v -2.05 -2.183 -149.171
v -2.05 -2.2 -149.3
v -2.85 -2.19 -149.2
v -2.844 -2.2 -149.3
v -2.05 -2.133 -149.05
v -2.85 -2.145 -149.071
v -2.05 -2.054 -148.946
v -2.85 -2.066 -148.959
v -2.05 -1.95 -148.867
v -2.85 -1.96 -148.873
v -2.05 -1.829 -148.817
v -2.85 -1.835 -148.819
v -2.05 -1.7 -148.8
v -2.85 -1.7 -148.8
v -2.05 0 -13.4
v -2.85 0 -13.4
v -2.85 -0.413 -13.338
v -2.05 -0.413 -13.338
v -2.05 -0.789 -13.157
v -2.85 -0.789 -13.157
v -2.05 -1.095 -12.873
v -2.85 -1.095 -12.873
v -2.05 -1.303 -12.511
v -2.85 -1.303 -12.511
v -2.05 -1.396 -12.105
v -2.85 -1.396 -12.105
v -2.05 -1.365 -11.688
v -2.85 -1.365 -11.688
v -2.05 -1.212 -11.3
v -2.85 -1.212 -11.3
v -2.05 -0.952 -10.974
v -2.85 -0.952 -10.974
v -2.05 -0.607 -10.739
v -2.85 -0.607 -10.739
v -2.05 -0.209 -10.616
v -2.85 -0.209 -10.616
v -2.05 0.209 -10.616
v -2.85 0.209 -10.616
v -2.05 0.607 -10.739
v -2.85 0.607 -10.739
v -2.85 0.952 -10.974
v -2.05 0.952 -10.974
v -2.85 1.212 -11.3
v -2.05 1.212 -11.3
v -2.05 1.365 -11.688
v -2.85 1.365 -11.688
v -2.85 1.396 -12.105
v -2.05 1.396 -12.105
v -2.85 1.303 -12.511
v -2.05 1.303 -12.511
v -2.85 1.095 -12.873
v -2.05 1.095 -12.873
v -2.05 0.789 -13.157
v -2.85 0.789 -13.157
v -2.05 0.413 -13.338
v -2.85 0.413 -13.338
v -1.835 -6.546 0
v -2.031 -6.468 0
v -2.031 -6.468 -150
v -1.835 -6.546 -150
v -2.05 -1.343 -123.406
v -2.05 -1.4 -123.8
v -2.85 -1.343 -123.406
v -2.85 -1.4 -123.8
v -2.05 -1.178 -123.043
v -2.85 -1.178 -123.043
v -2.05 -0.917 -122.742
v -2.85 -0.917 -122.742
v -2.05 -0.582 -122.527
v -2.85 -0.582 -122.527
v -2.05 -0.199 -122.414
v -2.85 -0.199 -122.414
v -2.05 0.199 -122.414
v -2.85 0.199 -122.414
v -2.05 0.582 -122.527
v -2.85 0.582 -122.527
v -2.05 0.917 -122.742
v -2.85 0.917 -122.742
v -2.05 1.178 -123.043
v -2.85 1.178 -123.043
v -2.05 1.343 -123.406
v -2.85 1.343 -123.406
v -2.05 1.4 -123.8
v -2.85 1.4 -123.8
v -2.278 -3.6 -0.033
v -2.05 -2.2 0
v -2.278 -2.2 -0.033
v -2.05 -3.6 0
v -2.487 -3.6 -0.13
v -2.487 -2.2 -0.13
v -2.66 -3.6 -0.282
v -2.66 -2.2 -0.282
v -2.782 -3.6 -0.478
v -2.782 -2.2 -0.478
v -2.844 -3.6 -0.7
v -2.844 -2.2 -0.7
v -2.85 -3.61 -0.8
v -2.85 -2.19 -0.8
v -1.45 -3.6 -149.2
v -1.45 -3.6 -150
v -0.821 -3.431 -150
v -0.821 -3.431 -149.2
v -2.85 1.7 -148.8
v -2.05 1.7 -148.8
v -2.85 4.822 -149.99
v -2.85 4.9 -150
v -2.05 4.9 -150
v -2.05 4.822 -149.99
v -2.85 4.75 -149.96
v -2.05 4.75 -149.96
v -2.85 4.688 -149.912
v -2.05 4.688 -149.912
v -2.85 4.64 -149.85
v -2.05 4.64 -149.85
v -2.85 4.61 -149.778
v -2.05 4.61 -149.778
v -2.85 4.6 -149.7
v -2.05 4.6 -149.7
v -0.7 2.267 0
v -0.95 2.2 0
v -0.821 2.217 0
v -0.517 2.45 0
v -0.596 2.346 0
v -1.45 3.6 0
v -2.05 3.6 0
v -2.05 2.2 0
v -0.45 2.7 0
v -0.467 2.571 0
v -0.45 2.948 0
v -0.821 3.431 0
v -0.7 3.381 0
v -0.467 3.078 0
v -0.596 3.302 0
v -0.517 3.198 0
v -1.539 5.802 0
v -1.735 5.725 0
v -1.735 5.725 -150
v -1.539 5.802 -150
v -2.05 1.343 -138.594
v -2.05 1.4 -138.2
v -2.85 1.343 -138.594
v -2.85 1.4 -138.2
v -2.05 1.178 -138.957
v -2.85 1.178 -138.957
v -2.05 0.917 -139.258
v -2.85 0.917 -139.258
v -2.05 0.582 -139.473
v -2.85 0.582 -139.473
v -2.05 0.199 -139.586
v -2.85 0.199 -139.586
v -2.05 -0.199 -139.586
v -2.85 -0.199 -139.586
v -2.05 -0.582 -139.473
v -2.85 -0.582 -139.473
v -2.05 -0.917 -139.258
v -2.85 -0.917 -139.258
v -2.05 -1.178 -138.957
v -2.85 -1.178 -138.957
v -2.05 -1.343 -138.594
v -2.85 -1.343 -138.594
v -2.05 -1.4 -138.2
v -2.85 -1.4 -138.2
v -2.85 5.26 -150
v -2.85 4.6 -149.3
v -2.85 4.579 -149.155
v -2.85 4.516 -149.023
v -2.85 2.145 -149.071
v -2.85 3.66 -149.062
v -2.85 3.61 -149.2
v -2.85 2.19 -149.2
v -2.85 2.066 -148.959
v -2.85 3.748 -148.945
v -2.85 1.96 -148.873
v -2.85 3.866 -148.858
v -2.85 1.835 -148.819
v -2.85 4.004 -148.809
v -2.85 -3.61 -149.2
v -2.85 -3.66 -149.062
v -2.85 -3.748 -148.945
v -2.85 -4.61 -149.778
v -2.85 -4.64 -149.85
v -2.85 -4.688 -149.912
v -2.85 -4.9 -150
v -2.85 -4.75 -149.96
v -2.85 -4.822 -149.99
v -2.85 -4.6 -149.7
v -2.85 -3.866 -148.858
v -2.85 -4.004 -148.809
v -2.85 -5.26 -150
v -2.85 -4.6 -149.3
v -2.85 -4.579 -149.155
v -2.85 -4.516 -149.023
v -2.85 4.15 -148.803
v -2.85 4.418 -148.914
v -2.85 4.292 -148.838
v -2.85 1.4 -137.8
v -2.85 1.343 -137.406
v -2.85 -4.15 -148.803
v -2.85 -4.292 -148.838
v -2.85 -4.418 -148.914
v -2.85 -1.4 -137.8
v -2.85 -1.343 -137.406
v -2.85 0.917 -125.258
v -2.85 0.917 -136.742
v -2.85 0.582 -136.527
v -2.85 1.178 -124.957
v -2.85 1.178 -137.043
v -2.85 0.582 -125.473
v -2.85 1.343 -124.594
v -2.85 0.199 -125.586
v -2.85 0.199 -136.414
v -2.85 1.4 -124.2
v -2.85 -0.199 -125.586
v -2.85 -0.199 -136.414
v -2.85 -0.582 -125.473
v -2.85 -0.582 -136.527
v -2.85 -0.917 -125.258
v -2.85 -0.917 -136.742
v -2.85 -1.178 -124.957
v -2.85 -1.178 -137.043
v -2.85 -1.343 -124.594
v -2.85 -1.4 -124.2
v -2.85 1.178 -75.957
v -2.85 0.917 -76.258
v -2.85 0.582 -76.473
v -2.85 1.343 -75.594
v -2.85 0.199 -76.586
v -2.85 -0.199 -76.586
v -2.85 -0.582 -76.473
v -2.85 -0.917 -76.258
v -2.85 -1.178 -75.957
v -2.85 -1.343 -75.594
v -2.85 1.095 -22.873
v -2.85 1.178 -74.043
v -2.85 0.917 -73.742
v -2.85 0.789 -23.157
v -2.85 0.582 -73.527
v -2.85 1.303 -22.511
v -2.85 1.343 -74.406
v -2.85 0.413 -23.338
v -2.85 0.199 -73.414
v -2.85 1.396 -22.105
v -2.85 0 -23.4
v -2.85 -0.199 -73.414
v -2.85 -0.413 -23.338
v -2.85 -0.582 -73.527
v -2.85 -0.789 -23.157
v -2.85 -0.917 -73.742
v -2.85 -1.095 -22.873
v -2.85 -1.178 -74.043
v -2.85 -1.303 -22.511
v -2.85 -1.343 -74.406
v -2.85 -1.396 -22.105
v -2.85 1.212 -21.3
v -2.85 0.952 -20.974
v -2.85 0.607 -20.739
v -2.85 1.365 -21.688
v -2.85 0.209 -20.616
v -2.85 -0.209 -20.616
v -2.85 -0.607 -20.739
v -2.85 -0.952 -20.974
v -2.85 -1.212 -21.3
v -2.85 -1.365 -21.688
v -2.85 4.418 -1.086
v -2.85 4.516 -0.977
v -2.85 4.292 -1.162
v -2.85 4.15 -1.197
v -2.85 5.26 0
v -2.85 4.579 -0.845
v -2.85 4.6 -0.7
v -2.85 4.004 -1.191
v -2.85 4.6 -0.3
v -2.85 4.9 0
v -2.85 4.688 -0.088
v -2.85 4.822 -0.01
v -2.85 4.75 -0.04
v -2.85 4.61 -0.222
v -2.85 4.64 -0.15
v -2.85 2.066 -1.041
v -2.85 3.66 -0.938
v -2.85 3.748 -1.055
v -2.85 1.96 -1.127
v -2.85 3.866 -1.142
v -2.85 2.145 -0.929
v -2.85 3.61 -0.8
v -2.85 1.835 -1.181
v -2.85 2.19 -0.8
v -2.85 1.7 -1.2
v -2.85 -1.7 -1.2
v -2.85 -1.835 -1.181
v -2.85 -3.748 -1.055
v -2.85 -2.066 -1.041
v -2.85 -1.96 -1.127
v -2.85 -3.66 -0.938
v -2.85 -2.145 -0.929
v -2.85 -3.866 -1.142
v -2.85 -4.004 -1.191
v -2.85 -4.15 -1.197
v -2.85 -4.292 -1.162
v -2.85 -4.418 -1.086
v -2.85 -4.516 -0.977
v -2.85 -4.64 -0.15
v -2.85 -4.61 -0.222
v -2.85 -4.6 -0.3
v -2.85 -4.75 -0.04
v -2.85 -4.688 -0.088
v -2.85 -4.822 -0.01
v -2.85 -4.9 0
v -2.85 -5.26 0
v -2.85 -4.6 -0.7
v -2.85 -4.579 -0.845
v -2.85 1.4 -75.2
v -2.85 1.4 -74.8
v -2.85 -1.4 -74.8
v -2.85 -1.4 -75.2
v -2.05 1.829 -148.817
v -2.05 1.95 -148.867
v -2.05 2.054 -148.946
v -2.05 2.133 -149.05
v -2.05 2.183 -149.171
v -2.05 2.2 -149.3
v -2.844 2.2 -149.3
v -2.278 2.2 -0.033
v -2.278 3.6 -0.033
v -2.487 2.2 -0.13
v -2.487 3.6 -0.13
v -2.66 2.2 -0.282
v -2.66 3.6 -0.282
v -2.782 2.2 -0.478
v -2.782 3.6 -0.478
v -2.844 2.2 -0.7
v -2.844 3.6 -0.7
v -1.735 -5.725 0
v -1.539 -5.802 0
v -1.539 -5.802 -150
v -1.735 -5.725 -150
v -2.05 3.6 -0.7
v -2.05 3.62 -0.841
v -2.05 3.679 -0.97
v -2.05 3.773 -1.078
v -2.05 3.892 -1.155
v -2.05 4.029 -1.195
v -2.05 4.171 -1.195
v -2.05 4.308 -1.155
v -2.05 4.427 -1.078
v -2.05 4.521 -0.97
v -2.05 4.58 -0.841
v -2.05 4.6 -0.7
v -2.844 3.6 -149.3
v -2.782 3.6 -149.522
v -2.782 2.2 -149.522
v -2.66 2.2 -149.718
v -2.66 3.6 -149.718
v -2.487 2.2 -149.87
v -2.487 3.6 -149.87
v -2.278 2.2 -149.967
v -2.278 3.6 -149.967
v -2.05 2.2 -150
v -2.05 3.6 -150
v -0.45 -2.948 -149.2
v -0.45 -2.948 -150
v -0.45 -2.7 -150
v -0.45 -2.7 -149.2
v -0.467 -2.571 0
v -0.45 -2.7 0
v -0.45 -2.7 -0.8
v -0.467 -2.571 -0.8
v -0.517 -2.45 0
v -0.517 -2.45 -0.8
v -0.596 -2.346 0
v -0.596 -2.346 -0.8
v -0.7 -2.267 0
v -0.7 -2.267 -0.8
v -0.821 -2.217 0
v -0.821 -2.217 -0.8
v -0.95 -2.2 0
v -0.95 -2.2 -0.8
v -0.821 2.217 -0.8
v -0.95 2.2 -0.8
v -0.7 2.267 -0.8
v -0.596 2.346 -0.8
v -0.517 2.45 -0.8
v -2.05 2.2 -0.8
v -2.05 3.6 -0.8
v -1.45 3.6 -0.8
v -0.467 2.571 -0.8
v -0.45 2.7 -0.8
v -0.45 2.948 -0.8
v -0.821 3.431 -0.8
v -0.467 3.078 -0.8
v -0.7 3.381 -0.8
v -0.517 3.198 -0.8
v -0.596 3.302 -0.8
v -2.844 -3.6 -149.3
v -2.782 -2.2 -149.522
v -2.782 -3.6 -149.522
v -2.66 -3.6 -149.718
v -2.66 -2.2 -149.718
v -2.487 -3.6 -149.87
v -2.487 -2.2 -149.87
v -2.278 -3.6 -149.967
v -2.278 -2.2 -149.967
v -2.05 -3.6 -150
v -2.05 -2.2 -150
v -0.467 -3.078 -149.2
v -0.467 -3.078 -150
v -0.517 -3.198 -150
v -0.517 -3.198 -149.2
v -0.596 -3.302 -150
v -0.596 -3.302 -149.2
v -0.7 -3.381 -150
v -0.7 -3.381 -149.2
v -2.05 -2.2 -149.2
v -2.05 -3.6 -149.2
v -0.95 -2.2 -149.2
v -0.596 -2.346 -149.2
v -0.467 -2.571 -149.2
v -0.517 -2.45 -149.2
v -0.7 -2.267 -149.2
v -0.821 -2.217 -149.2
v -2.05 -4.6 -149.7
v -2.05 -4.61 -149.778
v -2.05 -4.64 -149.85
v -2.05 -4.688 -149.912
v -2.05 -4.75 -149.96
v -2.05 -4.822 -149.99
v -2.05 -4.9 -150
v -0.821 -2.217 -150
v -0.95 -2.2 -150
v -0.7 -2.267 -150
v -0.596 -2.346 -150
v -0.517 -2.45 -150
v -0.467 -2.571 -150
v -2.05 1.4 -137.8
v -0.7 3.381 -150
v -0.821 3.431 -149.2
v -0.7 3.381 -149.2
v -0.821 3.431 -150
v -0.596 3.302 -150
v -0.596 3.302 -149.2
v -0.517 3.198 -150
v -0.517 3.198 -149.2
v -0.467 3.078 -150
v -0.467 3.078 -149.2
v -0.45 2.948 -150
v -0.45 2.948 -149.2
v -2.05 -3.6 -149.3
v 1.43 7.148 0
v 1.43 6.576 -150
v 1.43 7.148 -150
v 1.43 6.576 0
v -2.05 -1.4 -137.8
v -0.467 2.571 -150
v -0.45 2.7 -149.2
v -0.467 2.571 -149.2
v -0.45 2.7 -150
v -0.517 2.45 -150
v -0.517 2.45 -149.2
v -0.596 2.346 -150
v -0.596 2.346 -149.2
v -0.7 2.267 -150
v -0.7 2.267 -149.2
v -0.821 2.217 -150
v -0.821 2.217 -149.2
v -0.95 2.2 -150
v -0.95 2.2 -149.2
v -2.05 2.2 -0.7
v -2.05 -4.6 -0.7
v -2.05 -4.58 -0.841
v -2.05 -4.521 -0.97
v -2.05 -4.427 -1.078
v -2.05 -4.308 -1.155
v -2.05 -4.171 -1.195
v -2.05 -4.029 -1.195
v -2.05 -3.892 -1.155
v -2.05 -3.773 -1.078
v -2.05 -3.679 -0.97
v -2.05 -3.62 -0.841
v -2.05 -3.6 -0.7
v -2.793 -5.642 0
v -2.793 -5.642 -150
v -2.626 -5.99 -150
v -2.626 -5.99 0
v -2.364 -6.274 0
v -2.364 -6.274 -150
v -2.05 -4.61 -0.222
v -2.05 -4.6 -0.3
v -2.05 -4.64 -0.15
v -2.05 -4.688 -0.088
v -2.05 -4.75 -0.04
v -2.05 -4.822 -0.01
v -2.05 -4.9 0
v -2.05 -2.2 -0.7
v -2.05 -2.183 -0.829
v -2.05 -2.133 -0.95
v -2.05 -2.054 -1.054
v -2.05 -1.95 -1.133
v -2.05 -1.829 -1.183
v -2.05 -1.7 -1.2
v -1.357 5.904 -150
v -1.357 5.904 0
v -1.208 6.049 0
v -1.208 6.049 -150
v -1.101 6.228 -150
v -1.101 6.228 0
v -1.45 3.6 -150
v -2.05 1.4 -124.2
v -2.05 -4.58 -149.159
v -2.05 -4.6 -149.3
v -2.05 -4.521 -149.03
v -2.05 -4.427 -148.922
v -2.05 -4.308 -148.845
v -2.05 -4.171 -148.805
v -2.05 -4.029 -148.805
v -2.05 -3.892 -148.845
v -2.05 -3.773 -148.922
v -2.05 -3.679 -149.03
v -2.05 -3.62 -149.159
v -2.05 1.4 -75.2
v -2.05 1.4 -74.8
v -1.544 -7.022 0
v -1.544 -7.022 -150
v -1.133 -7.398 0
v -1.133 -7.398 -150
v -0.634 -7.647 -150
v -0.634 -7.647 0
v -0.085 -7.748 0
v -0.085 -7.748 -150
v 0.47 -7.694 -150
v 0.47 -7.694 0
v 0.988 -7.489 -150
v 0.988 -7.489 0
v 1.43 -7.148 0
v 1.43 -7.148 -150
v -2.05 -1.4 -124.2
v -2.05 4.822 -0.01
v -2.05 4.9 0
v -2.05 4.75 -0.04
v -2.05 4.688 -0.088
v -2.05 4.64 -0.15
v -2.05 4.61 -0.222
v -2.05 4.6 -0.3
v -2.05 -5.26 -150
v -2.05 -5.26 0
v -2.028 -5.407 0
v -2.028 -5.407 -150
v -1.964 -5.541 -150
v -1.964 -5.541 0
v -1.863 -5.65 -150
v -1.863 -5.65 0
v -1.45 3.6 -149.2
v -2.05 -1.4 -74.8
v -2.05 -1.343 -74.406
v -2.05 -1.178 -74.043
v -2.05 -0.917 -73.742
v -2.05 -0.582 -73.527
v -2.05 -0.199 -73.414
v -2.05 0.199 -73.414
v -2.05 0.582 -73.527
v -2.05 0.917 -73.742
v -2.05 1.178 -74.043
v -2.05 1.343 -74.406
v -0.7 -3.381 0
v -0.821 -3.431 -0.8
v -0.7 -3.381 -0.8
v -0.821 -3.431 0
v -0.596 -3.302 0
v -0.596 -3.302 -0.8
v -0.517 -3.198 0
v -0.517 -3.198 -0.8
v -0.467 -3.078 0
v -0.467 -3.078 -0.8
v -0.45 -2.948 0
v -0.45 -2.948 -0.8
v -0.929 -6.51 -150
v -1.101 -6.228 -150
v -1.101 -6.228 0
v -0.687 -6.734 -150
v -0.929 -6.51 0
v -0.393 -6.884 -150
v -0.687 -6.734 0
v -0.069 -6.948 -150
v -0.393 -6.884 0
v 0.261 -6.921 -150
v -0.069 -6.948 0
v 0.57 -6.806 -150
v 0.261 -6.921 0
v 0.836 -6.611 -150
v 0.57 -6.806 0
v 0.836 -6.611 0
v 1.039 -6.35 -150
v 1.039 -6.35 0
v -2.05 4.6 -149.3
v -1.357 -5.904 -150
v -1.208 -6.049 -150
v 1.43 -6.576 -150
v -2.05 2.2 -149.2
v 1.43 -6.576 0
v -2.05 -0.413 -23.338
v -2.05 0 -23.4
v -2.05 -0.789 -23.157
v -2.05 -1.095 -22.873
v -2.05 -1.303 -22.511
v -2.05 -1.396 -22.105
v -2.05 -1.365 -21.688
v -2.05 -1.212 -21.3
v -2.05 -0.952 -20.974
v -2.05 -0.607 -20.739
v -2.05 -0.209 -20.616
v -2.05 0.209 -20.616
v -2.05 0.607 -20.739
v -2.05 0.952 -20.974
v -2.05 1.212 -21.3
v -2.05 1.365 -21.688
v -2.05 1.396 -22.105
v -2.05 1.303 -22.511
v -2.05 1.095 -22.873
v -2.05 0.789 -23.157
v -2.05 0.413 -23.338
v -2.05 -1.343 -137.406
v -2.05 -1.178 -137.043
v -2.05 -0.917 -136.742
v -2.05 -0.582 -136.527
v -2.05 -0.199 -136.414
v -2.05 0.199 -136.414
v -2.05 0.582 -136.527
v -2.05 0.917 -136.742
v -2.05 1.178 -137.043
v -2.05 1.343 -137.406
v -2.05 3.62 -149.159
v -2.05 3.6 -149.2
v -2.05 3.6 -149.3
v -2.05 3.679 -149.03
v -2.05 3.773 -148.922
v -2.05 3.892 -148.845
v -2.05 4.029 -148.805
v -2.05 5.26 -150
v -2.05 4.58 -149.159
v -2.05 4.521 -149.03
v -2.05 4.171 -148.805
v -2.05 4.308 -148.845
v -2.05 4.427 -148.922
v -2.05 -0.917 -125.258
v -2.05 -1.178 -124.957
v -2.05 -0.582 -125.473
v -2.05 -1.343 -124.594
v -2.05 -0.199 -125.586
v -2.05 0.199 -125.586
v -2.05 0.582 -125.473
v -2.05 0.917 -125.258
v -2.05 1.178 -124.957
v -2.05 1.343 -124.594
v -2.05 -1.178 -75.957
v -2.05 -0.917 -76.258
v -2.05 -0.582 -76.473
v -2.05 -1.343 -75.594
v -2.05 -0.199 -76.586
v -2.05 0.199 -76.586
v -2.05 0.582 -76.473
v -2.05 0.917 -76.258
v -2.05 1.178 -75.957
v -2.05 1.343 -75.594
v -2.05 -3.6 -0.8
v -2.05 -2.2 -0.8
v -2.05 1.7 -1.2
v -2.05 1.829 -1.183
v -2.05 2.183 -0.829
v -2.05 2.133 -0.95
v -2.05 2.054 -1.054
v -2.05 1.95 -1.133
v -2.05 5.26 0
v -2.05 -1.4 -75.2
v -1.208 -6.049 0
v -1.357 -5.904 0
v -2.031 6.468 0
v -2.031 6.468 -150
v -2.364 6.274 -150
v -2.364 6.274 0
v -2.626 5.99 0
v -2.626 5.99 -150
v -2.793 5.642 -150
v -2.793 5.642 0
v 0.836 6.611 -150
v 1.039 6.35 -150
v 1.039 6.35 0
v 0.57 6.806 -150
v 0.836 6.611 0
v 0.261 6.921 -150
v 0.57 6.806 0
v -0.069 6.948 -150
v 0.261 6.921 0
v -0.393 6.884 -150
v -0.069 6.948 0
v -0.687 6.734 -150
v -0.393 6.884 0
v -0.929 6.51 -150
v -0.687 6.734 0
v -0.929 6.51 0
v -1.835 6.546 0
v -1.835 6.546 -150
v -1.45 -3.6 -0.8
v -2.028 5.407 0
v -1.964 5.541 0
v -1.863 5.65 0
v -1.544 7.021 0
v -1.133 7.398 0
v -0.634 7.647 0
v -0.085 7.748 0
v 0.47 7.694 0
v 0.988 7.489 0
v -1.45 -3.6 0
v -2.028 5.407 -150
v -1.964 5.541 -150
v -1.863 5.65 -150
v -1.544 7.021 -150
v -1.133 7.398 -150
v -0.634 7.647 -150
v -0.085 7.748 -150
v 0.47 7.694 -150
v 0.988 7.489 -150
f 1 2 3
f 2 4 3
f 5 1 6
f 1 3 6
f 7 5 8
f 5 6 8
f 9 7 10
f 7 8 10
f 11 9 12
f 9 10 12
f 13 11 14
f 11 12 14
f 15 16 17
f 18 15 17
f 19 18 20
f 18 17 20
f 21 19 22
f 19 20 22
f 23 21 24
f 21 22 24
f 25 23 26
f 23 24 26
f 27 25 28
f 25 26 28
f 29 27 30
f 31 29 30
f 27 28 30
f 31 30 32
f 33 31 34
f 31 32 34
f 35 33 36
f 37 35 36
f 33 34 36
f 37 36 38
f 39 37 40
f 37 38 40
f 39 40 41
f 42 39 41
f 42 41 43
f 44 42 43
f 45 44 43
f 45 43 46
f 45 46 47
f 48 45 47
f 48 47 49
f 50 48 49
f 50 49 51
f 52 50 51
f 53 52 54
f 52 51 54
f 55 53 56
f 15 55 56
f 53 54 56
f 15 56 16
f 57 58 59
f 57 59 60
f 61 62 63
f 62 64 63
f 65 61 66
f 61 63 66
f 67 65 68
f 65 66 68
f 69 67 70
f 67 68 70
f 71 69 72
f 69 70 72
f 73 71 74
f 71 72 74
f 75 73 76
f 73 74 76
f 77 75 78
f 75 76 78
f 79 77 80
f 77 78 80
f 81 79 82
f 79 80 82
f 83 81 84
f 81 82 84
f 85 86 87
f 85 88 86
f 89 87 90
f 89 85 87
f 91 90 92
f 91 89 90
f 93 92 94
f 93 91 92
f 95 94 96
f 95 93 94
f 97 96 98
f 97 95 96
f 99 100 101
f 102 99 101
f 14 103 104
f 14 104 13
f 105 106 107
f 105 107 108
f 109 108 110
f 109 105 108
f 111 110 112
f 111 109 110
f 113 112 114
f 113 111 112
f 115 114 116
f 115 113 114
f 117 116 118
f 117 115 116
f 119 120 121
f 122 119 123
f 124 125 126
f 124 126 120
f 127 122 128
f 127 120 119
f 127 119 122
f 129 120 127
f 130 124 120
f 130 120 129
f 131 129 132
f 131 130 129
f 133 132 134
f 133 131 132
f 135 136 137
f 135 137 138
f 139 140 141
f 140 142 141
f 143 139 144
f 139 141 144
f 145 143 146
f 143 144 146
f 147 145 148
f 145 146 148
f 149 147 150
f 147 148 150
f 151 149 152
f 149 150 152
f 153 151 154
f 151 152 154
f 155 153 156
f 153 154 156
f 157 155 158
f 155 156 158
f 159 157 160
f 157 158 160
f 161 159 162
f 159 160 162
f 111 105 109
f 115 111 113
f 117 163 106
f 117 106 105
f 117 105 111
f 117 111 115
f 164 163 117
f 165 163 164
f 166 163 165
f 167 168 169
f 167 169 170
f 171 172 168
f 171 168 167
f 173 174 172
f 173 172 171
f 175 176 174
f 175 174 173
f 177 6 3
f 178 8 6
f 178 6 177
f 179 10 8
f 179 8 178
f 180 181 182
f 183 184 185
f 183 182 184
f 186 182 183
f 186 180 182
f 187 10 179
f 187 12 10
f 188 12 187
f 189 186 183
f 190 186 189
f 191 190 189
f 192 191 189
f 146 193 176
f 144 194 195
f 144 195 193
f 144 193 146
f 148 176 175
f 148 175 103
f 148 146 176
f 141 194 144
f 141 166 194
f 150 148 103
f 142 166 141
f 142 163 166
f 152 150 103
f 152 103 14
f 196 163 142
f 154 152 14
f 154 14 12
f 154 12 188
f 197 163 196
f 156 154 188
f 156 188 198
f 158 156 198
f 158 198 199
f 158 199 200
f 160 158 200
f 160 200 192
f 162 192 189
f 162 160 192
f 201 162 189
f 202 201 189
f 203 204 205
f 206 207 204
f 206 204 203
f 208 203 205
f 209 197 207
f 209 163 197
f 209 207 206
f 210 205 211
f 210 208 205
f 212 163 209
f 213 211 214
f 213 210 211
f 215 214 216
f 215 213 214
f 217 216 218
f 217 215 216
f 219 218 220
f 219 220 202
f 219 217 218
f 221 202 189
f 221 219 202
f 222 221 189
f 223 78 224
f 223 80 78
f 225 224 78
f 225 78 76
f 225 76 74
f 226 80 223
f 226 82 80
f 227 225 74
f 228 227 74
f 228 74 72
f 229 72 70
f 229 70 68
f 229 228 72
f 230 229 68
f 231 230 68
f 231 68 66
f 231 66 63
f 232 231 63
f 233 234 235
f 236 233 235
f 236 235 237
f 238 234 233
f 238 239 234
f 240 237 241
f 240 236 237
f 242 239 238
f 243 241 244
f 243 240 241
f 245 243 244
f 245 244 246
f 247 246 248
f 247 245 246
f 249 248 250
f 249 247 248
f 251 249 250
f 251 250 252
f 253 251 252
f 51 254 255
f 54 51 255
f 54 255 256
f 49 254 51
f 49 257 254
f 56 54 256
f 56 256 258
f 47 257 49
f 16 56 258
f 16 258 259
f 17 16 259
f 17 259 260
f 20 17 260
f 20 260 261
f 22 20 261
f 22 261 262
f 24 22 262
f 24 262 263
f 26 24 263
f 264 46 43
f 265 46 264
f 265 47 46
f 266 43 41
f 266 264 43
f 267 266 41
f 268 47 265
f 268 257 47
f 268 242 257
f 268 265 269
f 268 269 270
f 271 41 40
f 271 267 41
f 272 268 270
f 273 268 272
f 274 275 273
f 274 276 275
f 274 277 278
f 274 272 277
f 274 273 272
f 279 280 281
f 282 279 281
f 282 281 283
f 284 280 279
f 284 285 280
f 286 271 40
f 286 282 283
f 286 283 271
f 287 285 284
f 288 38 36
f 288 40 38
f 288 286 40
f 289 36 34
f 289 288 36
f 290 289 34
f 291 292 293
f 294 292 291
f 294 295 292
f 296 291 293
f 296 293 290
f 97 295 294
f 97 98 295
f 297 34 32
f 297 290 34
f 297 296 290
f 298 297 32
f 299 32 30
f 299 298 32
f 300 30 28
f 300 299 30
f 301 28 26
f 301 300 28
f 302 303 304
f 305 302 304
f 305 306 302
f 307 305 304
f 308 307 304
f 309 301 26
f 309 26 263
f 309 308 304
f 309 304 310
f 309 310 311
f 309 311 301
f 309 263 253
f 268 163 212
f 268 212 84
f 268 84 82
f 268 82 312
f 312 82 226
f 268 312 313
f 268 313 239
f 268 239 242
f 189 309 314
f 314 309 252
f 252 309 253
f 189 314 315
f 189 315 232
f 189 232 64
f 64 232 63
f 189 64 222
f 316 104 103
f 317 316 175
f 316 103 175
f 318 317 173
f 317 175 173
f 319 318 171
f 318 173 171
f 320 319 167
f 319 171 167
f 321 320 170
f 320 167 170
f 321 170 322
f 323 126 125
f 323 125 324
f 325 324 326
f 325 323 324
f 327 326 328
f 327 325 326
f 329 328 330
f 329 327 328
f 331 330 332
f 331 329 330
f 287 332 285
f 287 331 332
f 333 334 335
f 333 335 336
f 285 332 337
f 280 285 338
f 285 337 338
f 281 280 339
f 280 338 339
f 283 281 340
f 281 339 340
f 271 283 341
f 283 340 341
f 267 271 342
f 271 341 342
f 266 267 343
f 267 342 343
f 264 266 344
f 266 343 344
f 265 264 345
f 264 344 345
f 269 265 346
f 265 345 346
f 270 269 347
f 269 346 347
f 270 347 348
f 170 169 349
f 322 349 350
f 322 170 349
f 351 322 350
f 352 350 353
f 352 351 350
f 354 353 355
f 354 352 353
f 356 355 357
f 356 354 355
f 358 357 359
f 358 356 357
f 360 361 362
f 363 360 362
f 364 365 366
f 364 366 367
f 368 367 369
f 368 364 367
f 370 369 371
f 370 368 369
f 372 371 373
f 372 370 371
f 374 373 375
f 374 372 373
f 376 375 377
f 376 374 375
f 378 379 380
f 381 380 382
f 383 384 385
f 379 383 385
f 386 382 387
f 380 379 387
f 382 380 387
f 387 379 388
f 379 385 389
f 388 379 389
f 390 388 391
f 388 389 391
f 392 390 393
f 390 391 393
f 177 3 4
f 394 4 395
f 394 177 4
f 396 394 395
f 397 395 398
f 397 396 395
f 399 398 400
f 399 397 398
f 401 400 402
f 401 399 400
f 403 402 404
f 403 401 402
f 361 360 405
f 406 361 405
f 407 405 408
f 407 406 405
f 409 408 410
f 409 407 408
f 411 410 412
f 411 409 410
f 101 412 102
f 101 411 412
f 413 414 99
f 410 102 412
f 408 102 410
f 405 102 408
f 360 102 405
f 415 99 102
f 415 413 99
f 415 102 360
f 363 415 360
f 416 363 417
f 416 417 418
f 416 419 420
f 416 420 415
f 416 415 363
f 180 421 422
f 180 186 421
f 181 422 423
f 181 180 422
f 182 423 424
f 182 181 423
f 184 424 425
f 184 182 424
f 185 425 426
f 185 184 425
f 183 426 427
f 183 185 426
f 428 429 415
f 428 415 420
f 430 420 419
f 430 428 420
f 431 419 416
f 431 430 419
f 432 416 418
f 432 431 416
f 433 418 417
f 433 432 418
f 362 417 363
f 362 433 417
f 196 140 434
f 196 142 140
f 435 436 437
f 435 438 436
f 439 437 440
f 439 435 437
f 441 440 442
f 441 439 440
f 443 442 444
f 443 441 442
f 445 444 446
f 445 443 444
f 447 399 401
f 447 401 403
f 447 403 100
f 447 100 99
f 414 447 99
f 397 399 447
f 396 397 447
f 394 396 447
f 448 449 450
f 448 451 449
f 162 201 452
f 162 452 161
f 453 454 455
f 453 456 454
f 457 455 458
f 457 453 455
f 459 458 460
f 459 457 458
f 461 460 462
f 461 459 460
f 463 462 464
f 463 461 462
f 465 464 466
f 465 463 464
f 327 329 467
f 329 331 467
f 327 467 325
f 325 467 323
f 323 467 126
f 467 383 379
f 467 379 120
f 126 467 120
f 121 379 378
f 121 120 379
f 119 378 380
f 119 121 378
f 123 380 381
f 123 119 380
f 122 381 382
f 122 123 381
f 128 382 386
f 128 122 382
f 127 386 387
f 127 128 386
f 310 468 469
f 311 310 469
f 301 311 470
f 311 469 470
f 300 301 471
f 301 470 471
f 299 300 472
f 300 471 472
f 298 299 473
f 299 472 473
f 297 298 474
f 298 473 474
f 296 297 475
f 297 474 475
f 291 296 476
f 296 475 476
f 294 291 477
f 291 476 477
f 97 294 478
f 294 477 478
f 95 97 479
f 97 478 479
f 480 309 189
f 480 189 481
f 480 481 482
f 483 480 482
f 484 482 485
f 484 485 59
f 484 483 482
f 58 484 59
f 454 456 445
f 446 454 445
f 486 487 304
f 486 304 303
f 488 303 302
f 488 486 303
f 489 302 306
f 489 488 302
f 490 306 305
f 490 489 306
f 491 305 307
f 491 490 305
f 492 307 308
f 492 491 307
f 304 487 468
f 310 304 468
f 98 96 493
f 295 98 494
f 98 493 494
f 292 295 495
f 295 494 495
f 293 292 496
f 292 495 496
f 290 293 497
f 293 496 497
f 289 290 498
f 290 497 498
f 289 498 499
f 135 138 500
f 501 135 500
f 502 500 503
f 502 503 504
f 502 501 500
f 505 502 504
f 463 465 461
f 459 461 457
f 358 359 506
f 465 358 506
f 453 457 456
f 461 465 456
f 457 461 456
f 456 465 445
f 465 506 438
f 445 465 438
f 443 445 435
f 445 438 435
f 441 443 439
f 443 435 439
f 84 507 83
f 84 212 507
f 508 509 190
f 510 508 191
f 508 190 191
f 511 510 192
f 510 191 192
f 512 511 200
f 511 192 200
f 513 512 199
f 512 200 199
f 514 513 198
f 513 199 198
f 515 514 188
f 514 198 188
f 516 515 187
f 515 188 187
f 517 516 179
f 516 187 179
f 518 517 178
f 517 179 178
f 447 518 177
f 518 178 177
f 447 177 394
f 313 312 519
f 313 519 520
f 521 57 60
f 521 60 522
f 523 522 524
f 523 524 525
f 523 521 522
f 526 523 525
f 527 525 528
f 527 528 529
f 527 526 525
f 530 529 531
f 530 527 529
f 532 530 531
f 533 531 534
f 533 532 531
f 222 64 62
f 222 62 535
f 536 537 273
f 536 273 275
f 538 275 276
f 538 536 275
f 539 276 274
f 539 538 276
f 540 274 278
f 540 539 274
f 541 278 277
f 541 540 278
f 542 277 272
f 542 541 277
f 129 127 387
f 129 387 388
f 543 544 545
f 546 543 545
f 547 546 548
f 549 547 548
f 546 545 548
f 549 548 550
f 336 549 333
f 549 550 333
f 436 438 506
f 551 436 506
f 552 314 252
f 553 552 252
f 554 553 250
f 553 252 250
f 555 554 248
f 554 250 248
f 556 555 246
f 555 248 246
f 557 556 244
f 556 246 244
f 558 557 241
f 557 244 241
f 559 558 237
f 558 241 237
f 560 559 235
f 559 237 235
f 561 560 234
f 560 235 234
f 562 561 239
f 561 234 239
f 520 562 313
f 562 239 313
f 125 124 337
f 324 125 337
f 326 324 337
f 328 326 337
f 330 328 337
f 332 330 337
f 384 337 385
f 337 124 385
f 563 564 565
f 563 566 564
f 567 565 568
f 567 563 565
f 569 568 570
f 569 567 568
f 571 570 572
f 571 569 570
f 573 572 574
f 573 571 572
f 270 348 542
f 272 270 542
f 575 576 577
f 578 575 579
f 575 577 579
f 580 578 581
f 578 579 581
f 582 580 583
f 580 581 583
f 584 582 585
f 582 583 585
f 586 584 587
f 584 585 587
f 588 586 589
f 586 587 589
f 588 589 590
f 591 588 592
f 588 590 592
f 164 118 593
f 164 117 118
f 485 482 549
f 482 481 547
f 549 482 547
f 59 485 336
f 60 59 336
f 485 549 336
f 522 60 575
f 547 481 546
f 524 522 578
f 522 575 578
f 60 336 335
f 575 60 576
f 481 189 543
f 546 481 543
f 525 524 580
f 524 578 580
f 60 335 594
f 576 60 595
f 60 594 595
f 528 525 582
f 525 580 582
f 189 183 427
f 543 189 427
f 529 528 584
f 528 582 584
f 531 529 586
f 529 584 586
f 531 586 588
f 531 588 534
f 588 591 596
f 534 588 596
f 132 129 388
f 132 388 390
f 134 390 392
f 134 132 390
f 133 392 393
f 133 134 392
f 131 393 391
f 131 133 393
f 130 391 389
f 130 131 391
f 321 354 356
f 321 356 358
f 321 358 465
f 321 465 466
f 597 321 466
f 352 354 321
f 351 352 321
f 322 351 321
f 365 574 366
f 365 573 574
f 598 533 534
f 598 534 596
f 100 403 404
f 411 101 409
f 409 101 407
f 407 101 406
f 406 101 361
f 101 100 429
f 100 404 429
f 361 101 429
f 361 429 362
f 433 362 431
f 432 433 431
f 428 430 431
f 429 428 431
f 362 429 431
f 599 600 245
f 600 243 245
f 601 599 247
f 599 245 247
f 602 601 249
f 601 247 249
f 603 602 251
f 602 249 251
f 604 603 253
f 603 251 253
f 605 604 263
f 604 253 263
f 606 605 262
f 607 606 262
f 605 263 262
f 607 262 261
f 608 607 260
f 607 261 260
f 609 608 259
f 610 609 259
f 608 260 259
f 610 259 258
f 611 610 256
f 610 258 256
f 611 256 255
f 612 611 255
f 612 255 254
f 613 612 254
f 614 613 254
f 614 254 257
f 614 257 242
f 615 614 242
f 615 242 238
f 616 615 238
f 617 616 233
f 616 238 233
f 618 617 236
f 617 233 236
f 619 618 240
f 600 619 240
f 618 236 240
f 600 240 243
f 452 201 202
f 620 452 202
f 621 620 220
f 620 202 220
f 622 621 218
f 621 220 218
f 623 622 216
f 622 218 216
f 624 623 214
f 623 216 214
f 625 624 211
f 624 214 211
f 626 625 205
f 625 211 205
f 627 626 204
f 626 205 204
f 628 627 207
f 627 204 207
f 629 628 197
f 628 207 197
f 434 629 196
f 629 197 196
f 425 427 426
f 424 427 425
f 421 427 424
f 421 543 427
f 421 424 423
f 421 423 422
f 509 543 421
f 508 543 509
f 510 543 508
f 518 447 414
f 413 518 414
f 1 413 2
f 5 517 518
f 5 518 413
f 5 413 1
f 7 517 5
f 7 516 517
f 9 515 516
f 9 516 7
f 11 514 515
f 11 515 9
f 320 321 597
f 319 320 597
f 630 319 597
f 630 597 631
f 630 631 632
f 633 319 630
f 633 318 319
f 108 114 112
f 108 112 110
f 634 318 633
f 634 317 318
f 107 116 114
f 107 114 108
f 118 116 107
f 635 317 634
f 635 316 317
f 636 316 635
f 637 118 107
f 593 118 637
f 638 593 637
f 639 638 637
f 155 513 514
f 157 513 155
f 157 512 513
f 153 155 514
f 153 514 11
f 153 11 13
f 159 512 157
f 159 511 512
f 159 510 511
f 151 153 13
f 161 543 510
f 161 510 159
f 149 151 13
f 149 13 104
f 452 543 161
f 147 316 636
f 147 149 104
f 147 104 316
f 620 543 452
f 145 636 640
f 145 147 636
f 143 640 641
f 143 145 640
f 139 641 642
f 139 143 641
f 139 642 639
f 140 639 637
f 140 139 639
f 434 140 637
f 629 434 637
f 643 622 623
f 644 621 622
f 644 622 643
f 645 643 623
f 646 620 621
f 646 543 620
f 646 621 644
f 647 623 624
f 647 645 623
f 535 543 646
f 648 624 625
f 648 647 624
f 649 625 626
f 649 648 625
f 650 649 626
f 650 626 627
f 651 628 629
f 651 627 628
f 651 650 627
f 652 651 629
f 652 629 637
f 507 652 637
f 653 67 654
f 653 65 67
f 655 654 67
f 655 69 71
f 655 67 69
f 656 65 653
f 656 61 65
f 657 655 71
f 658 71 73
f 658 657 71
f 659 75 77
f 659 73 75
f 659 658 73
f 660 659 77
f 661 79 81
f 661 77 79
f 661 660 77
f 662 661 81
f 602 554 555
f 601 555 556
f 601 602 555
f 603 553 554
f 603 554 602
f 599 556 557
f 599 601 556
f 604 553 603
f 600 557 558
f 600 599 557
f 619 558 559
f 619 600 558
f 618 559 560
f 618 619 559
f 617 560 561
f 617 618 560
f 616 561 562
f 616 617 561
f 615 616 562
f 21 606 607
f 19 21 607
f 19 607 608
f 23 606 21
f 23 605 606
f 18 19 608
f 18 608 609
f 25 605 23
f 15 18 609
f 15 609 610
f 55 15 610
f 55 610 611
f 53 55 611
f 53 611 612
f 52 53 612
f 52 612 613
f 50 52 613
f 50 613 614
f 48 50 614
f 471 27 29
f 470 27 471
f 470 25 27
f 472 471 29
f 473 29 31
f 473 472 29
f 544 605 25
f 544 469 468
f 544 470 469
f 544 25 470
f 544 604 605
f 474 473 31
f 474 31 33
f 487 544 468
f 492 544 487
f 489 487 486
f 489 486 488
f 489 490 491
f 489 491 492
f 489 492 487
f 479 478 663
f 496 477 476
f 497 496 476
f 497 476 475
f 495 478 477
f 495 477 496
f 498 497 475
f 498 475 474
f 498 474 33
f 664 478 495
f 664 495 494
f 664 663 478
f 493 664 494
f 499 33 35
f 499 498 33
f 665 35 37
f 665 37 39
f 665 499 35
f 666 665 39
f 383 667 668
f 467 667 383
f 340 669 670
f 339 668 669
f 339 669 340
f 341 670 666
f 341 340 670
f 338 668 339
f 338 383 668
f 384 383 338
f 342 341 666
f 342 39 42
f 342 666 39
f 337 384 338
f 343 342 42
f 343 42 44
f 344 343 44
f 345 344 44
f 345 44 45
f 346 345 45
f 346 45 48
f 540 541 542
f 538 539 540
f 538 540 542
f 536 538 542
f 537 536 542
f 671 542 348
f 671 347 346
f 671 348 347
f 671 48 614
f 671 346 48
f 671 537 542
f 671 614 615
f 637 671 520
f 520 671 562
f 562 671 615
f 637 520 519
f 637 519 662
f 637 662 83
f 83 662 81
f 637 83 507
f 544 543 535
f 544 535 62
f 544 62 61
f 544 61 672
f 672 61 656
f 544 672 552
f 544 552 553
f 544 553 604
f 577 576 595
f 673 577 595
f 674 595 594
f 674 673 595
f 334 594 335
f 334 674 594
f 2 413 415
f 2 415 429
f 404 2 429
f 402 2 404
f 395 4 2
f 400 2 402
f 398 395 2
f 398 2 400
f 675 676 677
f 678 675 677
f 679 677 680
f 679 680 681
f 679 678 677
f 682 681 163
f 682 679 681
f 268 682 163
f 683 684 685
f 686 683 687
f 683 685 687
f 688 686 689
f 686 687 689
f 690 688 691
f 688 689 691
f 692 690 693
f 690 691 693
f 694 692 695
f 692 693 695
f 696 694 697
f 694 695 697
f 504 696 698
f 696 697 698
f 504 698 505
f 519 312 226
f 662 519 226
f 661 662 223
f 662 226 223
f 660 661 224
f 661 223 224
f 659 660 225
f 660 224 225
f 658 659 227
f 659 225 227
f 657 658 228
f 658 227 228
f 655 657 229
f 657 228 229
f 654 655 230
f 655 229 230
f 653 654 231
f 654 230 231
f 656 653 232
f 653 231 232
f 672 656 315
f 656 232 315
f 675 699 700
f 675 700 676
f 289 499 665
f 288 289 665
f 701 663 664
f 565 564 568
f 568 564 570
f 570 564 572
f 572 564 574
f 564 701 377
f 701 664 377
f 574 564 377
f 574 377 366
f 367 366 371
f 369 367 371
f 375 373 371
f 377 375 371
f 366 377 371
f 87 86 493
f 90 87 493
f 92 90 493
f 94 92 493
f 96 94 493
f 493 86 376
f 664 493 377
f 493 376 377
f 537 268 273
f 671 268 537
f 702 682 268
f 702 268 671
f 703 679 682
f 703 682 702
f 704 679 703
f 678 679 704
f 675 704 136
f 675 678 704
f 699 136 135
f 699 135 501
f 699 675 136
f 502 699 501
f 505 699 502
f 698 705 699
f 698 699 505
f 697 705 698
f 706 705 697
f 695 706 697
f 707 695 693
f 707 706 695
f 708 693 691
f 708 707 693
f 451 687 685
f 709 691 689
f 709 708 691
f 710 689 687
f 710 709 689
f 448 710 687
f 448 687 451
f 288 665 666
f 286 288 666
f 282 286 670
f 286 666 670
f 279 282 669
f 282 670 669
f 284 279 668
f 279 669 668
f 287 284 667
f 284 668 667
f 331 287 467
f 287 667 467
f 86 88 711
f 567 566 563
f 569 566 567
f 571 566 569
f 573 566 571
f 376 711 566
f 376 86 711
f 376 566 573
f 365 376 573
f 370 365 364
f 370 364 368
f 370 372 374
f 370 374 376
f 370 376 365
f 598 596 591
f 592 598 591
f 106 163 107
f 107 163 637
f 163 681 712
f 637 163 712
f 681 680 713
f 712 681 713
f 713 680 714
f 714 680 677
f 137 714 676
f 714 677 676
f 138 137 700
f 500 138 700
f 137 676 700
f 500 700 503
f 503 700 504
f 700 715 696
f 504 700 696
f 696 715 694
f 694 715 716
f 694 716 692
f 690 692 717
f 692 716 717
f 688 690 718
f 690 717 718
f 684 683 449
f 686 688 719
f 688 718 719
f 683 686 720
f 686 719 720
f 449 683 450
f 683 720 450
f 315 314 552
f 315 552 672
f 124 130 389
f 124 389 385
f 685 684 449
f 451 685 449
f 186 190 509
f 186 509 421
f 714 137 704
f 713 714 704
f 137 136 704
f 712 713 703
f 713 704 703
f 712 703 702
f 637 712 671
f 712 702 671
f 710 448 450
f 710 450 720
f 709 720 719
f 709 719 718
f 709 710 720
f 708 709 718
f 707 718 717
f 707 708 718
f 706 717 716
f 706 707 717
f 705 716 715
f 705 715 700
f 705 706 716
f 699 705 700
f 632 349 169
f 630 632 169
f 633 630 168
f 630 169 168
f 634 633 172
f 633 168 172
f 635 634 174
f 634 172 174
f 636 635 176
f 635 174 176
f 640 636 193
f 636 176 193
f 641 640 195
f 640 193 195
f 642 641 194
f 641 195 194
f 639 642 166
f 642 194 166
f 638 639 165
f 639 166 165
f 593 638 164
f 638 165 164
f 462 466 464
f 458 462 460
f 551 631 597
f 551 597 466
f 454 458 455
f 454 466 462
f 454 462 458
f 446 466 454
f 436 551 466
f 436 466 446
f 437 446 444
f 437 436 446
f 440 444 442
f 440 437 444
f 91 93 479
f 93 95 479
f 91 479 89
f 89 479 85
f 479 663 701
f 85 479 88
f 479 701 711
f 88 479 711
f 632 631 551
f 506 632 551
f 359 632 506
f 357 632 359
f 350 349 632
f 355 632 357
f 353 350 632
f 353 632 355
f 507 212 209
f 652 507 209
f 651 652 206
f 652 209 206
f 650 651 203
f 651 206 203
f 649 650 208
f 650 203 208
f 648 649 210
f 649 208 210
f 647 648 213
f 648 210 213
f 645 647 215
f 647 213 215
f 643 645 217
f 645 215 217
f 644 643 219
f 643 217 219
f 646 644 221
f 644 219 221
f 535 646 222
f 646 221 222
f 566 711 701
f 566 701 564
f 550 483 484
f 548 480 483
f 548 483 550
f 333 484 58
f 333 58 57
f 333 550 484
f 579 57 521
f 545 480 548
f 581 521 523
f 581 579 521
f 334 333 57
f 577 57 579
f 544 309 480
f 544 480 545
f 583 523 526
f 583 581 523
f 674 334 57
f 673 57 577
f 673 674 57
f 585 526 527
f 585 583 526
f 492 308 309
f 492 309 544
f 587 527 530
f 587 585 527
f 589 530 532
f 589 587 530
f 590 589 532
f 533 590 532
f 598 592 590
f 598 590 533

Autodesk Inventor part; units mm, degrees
sketch "_____1" plane through (0, 0, 0) normal (0, 0, 1) x (1, 0, 0)
  line L0 (-2.85, 5.26) -> (-2.85, -5.26)
  arc A0 (-2.85, -5.26) -> (-2.0307, -6.4679) centre (-1.55, -5.26) ccw
  line L1 (-2.0307, -6.4679) -> (-1.8349, -6.5458)
  arc A1 (-1.8349, -6.5458) -> (1.43, -7.1482) centre (0, -5.75) ccw
  line L2 (1.43, -7.1482) -> (1.43, -6.5756)
  line L3 (1.43, -6.5756) -> (1.0392, -6.35)
  arc A2 (-1.1009, -6.2275) -> (1.0392, -6.35) centre (0, -5.75) ccw
  arc A3 (-1.1009, -6.2275) -> (-1.5391, -5.8025) centre (-1.8349, -6.5458) ccw
  line L4 (-1.5391, -5.8025) -> (-1.7349, -5.7246)
  arc A4 (-2.05, -5.26) -> (-1.7349, -5.7246) centre (-1.55, -5.26) ccw
  line L5 (-2.05, -5.26) -> (-2.05, 5.26)
  arc A5 (-1.7349, 5.7246) -> (-2.05, 5.26) centre (-1.55, 5.26) ccw
  line L6 (-1.7349, 5.7246) -> (-1.5391, 5.8025)
  arc A6 (-1.5391, 5.8025) -> (-1.1009, 6.2275) centre (-1.8349, 6.5458) ccw
  arc A7 (1.0392, 6.35) -> (-1.1009, 6.2275) centre (0, 5.75) ccw
  line L7 (1.0392, 6.35) -> (1.43, 6.5756)
  line L8 (1.43, 6.5756) -> (1.43, 7.1482)
  arc A8 (1.43, 7.1482) -> (-1.8349, 6.5458) centre (0, 5.75) ccw
  line L9 (-1.8349, 6.5458) -> (-2.0307, 6.4679)
  arc A9 (-2.0307, 6.4679) -> (-2.85, 5.26) centre (-1.55, 5.26) ccw
extrude "Extrusion1" add sketch "_____1" against normal blind 150
sketch "_____3" plane through (0, 0, 0) normal (0, 0, 1) x (1, 0, 0)
  line L0 (-2.05, 3.6) -> (-2.05, 2.2)
  line L1 (-2.05, 2.2) -> (-0.95, 2.2)
  arc A0 (-0.95, 2.2) -> (-0.45, 2.7) centre (-0.95, 2.7) ccw
  line L2 (-0.45, 2.7) -> (-0.45, 2.9484)
  arc A1 (-0.45, 2.9484) -> (-0.8206, 3.4314) centre (-0.95, 2.9484) ccw
  line L3 (-0.8206, 3.4314) -> (-1.45, 3.6)
  line L4 (-1.45, 3.6) -> (-2.05, 3.6)
extrude "Extrusion2" add sketch "_____3" against normal blind 0.8
sketch "_____5" plane through (0, 0, 0) normal (0, 0, 1) x (1, 0, 0)
  line L0 (-2.05, -3.6) -> (-1.45, -3.6)
  line L1 (-1.45, -3.6) -> (-0.8206, -3.4314)
  arc A0 (-0.8206, -3.4314) -> (-0.45, -2.9484) centre (-0.95, -2.9484) ccw
  line L2 (-0.45, -2.9484) -> (-0.45, -2.7)
  arc A1 (-0.45, -2.7) -> (-0.95, -2.2) centre (-0.95, -2.7) ccw
  line L3 (-0.95, -2.2) -> (-2.05, -2.2)
  line L4 (-2.05, -2.2) -> (-2.05, -3.6)
extrude "Extrusion3" add sketch "_____5" against normal blind 0.8
sketch "_____4" plane through (0, 0, 0) normal (1, 0, 0) x (0, 1, 0)
  line L0 (7.75, 1) -> (-7.75, 1)
  line L1 (-7.75, 1) -> (-7.75, 0)
  line L2 (-7.75, 0) -> (-4.9, 0)
  arc A0 (-4.6, -0.3) -> (-4.9, 0) centre (-4.9, -0.3) ccw
  line L3 (-4.6, -0.3) -> (-4.6, -0.7)
  arc A1 (-4.6, -0.7) -> (-4.1, -1.2) centre (-4.1, -0.7) ccw
  arc A2 (-4.1, -1.2) -> (-3.6, -0.7) centre (-4.1, -0.7) ccw
  line L4 (-3.6, -0.7) -> (-3.6, 0)
  line L5 (-3.6, 0) -> (-2.2, 0)
  line L6 (-2.2, 0) -> (-2.2, -0.7)
  arc A3 (-2.2, -0.7) -> (-1.7, -1.2) centre (-1.7, -0.7) ccw
  line L7 (-1.7, -1.2) -> (1.7, -1.2)
  arc A4 (1.7, -1.2) -> (2.2, -0.7) centre (1.7, -0.7) ccw
  line L8 (2.2, -0.7) -> (2.2, 0)
  line L9 (2.2, 0) -> (3.6, 0)
  line L10 (3.6, 0) -> (3.6, -0.7)
  arc A5 (3.6, -0.7) -> (4.1, -1.2) centre (4.1, -0.7) ccw
  arc A6 (4.1, -1.2) -> (4.6, -0.7) centre (4.1, -0.7) ccw
  line L11 (4.6, -0.7) -> (4.6, -0.3)
  arc A7 (4.9, 0) -> (4.6, -0.3) centre (4.9, -0.3) ccw
  line L12 (4.9, 0) -> (7.75, 0)
  line L13 (7.75, 0) -> (7.75, 1)
extrude "Extrusion4" cut sketch "_____4" against normal blind 4.28
sketch "_____6" plane through (0, 0, 0) normal (0, 1, 0) x (1, 0, 0)
  line L0 (-2.85, 0.8) -> (-2.85, 0)
  line L1 (-2.85, 0) -> (-2.05, 0)
  arc A0 (-2.85, 0.8) -> (-2.05, 0) centre (-2.05, 0.8) ccw
extrude "Extrusion5" cut sketch "_____6" along normal mid plane 8.2
sketch "_____2" plane through (0, 0, -150) normal (0, 0, 1) x (1, 0, 0)
  line L0 (-2.05, 3.6) -> (-2.05, 2.2)
  line L1 (-2.05, 2.2) -> (-0.95, 2.2)
  arc A0 (-0.95, 2.2) -> (-0.45, 2.7) centre (-0.95, 2.7) ccw
  line L2 (-0.45, 2.7) -> (-0.45, 2.9484)
  arc A1 (-0.45, 2.9484) -> (-0.8206, 3.4314) centre (-0.95, 2.9484) ccw
  line L3 (-0.8206, 3.4314) -> (-1.45, 3.6)
  line L4 (-1.45, 3.6) -> (-2.05, 3.6)
extrude "Extrusion6" add sketch "_____2" along normal blind 0.8
sketch "_____7" plane through (0, 0, -150) normal (0, 0, 1) x (1, 0, 0)
  line L0 (-2.05, -3.6) -> (-1.45, -3.6)
  line L1 (-1.45, -3.6) -> (-0.8206, -3.4314)
  arc A0 (-0.8206, -3.4314) -> (-0.45, -2.9484) centre (-0.95, -2.9484) ccw
  line L2 (-0.45, -2.9484) -> (-0.45, -2.7)
  arc A1 (-0.45, -2.7) -> (-0.95, -2.2) centre (-0.95, -2.7) ccw
  line L3 (-0.95, -2.2) -> (-2.05, -2.2)
  line L4 (-2.05, -2.2) -> (-2.05, -3.6)
extrude "Extrusion7" add sketch "_____7" along normal blind 0.8
sketch "_____8" plane through (-2.85, 0, 0) normal (1, 0, 0) x (0, 0, -1)
  arc A0 (148.8, -4.1) -> (149.3, -4.6) centre (149.3, -4.1) ccw
  line L0 (149.3, -4.6) -> (149.7, -4.6)
  arc A1 (150, -4.9) -> (149.7, -4.6) centre (149.7, -4.9) ccw
  line L1 (150, -4.9) -> (150, -7.75)
  line L2 (150, -7.75) -> (151, -7.75)
  line L3 (151, -7.75) -> (151, 7.75)
  line L4 (151, 7.75) -> (150, 7.75)
  line L5 (150, 7.75) -> (150, 4.9)
  arc A2 (149.7, 4.6) -> (150, 4.9) centre (149.7, 4.9) ccw
  line L6 (149.7, 4.6) -> (149.3, 4.6)
  arc A3 (149.3, 4.6) -> (148.8, 4.1) centre (149.3, 4.1) ccw
  arc A4 (148.8, 4.1) -> (149.3, 3.6) centre (149.3, 4.1) ccw
  line L7 (149.3, 3.6) -> (150, 3.6)
  line L8 (150, 3.6) -> (150, 2.2)
  line L9 (150, 2.2) -> (149.3, 2.2)
  arc A5 (149.3, 2.2) -> (148.8, 1.7) centre (149.3, 1.7) ccw
  line L10 (148.8, 1.7) -> (148.8, -1.7)
  arc A6 (148.8, -1.7) -> (149.3, -2.2) centre (149.3, -1.7) ccw
  line L11 (149.3, -2.2) -> (150, -2.2)
  line L12 (150, -2.2) -> (150, -3.6)
  line L13 (150, -3.6) -> (149.3, -3.6)
  arc A7 (149.3, -3.6) -> (148.8, -4.1) centre (149.3, -4.1) ccw
extrude "Extrusion8" cut sketch "_____8" along normal blind 0.8
sketch "_____9" plane through (0, 0, 0) normal (0, 1, 0) x (1, 0, 0)
  arc A0 (-2.05, 150) -> (-2.85, 149.2) centre (-2.05, 149.2) ccw
  line L0 (-2.05, 150) -> (-2.85, 150)
  line L1 (-2.85, 150) -> (-2.85, 149.2)
extrude "Extrusion9" cut sketch "_____9" along normal mid plane 8.2
sketch "Sketch10" plane through (-2.05, 5.26, 0) normal (1, 0, 0) x (0, 0, -1)
  point P0 (12, -5.26)
hole "Hole1" at (-2.05, 0, -12) direction (-1, 0, 0) diameter 2.8 depth 0.8
pattern_linear "Rectangular Pattern1" count 2 spacing 10 along (0, 0, -1) of "Hole1"
sketch "_____12" plane through (-2.85, 0, 0) normal (1, 0, 0) x (0, 0, -1)
  arc A0 (123.8, 1.4) -> (123.8, -1.4) centre (123.8, 0) ccw
  line L0 (123.8, -1.4) -> (124.2, -1.4)
  arc A1 (124.2, -1.4) -> (124.2, 1.4) centre (124.2, 0) ccw
  line L1 (124.2, 1.4) -> (123.8, 1.4)
extrude "Extrusion10" cut sketch "_____12" along normal blind 0.8
sketch "_____13" plane through (-2.85, 0, 0) normal (1, 0, 0) x (0, 0, -1)
  arc A0 (137.8, 1.4) -> (137.8, -1.4) centre (137.8, 0) ccw
  line L0 (137.8, -1.4) -> (138.2, -1.4)
  arc A1 (138.2, -1.4) -> (138.2, 1.4) centre (138.2, 0) ccw
  line L1 (138.2, 1.4) -> (137.8, 1.4)
extrude "Extrusion11" cut sketch "_____13" along normal blind 0.8
sketch "_____14" plane through (-2.85, 0, 0) normal (1, 0, 0) x (0, 0, -1)
  arc A0 (74.8, 1.4) -> (74.8, -1.4) centre (74.8, 0) ccw
  line L0 (74.8, -1.4) -> (75.2, -1.4)
  arc A1 (75.2, -1.4) -> (75.2, 1.4) centre (75.2, 0) ccw
  line L1 (75.2, 1.4) -> (74.8, 1.4)
extrude "Extrusion12" cut sketch "_____14" along normal blind 0.8
ref_plane "to_retainer_XY" through (0, 0, 0) normal (0, 0, 1) x (1, 0, 0)
ref_plane "to_retainer_YZ" through (0, 0, 0) normal (1, 0, 0) x (0, 1, 0)
ref_plane "to_retainer_ZX" through (0, 0, 0) normal (0, 1, 0) x (0, 0, 1)
properties part number "SSRC215_or" material "ステンレス鋼"
